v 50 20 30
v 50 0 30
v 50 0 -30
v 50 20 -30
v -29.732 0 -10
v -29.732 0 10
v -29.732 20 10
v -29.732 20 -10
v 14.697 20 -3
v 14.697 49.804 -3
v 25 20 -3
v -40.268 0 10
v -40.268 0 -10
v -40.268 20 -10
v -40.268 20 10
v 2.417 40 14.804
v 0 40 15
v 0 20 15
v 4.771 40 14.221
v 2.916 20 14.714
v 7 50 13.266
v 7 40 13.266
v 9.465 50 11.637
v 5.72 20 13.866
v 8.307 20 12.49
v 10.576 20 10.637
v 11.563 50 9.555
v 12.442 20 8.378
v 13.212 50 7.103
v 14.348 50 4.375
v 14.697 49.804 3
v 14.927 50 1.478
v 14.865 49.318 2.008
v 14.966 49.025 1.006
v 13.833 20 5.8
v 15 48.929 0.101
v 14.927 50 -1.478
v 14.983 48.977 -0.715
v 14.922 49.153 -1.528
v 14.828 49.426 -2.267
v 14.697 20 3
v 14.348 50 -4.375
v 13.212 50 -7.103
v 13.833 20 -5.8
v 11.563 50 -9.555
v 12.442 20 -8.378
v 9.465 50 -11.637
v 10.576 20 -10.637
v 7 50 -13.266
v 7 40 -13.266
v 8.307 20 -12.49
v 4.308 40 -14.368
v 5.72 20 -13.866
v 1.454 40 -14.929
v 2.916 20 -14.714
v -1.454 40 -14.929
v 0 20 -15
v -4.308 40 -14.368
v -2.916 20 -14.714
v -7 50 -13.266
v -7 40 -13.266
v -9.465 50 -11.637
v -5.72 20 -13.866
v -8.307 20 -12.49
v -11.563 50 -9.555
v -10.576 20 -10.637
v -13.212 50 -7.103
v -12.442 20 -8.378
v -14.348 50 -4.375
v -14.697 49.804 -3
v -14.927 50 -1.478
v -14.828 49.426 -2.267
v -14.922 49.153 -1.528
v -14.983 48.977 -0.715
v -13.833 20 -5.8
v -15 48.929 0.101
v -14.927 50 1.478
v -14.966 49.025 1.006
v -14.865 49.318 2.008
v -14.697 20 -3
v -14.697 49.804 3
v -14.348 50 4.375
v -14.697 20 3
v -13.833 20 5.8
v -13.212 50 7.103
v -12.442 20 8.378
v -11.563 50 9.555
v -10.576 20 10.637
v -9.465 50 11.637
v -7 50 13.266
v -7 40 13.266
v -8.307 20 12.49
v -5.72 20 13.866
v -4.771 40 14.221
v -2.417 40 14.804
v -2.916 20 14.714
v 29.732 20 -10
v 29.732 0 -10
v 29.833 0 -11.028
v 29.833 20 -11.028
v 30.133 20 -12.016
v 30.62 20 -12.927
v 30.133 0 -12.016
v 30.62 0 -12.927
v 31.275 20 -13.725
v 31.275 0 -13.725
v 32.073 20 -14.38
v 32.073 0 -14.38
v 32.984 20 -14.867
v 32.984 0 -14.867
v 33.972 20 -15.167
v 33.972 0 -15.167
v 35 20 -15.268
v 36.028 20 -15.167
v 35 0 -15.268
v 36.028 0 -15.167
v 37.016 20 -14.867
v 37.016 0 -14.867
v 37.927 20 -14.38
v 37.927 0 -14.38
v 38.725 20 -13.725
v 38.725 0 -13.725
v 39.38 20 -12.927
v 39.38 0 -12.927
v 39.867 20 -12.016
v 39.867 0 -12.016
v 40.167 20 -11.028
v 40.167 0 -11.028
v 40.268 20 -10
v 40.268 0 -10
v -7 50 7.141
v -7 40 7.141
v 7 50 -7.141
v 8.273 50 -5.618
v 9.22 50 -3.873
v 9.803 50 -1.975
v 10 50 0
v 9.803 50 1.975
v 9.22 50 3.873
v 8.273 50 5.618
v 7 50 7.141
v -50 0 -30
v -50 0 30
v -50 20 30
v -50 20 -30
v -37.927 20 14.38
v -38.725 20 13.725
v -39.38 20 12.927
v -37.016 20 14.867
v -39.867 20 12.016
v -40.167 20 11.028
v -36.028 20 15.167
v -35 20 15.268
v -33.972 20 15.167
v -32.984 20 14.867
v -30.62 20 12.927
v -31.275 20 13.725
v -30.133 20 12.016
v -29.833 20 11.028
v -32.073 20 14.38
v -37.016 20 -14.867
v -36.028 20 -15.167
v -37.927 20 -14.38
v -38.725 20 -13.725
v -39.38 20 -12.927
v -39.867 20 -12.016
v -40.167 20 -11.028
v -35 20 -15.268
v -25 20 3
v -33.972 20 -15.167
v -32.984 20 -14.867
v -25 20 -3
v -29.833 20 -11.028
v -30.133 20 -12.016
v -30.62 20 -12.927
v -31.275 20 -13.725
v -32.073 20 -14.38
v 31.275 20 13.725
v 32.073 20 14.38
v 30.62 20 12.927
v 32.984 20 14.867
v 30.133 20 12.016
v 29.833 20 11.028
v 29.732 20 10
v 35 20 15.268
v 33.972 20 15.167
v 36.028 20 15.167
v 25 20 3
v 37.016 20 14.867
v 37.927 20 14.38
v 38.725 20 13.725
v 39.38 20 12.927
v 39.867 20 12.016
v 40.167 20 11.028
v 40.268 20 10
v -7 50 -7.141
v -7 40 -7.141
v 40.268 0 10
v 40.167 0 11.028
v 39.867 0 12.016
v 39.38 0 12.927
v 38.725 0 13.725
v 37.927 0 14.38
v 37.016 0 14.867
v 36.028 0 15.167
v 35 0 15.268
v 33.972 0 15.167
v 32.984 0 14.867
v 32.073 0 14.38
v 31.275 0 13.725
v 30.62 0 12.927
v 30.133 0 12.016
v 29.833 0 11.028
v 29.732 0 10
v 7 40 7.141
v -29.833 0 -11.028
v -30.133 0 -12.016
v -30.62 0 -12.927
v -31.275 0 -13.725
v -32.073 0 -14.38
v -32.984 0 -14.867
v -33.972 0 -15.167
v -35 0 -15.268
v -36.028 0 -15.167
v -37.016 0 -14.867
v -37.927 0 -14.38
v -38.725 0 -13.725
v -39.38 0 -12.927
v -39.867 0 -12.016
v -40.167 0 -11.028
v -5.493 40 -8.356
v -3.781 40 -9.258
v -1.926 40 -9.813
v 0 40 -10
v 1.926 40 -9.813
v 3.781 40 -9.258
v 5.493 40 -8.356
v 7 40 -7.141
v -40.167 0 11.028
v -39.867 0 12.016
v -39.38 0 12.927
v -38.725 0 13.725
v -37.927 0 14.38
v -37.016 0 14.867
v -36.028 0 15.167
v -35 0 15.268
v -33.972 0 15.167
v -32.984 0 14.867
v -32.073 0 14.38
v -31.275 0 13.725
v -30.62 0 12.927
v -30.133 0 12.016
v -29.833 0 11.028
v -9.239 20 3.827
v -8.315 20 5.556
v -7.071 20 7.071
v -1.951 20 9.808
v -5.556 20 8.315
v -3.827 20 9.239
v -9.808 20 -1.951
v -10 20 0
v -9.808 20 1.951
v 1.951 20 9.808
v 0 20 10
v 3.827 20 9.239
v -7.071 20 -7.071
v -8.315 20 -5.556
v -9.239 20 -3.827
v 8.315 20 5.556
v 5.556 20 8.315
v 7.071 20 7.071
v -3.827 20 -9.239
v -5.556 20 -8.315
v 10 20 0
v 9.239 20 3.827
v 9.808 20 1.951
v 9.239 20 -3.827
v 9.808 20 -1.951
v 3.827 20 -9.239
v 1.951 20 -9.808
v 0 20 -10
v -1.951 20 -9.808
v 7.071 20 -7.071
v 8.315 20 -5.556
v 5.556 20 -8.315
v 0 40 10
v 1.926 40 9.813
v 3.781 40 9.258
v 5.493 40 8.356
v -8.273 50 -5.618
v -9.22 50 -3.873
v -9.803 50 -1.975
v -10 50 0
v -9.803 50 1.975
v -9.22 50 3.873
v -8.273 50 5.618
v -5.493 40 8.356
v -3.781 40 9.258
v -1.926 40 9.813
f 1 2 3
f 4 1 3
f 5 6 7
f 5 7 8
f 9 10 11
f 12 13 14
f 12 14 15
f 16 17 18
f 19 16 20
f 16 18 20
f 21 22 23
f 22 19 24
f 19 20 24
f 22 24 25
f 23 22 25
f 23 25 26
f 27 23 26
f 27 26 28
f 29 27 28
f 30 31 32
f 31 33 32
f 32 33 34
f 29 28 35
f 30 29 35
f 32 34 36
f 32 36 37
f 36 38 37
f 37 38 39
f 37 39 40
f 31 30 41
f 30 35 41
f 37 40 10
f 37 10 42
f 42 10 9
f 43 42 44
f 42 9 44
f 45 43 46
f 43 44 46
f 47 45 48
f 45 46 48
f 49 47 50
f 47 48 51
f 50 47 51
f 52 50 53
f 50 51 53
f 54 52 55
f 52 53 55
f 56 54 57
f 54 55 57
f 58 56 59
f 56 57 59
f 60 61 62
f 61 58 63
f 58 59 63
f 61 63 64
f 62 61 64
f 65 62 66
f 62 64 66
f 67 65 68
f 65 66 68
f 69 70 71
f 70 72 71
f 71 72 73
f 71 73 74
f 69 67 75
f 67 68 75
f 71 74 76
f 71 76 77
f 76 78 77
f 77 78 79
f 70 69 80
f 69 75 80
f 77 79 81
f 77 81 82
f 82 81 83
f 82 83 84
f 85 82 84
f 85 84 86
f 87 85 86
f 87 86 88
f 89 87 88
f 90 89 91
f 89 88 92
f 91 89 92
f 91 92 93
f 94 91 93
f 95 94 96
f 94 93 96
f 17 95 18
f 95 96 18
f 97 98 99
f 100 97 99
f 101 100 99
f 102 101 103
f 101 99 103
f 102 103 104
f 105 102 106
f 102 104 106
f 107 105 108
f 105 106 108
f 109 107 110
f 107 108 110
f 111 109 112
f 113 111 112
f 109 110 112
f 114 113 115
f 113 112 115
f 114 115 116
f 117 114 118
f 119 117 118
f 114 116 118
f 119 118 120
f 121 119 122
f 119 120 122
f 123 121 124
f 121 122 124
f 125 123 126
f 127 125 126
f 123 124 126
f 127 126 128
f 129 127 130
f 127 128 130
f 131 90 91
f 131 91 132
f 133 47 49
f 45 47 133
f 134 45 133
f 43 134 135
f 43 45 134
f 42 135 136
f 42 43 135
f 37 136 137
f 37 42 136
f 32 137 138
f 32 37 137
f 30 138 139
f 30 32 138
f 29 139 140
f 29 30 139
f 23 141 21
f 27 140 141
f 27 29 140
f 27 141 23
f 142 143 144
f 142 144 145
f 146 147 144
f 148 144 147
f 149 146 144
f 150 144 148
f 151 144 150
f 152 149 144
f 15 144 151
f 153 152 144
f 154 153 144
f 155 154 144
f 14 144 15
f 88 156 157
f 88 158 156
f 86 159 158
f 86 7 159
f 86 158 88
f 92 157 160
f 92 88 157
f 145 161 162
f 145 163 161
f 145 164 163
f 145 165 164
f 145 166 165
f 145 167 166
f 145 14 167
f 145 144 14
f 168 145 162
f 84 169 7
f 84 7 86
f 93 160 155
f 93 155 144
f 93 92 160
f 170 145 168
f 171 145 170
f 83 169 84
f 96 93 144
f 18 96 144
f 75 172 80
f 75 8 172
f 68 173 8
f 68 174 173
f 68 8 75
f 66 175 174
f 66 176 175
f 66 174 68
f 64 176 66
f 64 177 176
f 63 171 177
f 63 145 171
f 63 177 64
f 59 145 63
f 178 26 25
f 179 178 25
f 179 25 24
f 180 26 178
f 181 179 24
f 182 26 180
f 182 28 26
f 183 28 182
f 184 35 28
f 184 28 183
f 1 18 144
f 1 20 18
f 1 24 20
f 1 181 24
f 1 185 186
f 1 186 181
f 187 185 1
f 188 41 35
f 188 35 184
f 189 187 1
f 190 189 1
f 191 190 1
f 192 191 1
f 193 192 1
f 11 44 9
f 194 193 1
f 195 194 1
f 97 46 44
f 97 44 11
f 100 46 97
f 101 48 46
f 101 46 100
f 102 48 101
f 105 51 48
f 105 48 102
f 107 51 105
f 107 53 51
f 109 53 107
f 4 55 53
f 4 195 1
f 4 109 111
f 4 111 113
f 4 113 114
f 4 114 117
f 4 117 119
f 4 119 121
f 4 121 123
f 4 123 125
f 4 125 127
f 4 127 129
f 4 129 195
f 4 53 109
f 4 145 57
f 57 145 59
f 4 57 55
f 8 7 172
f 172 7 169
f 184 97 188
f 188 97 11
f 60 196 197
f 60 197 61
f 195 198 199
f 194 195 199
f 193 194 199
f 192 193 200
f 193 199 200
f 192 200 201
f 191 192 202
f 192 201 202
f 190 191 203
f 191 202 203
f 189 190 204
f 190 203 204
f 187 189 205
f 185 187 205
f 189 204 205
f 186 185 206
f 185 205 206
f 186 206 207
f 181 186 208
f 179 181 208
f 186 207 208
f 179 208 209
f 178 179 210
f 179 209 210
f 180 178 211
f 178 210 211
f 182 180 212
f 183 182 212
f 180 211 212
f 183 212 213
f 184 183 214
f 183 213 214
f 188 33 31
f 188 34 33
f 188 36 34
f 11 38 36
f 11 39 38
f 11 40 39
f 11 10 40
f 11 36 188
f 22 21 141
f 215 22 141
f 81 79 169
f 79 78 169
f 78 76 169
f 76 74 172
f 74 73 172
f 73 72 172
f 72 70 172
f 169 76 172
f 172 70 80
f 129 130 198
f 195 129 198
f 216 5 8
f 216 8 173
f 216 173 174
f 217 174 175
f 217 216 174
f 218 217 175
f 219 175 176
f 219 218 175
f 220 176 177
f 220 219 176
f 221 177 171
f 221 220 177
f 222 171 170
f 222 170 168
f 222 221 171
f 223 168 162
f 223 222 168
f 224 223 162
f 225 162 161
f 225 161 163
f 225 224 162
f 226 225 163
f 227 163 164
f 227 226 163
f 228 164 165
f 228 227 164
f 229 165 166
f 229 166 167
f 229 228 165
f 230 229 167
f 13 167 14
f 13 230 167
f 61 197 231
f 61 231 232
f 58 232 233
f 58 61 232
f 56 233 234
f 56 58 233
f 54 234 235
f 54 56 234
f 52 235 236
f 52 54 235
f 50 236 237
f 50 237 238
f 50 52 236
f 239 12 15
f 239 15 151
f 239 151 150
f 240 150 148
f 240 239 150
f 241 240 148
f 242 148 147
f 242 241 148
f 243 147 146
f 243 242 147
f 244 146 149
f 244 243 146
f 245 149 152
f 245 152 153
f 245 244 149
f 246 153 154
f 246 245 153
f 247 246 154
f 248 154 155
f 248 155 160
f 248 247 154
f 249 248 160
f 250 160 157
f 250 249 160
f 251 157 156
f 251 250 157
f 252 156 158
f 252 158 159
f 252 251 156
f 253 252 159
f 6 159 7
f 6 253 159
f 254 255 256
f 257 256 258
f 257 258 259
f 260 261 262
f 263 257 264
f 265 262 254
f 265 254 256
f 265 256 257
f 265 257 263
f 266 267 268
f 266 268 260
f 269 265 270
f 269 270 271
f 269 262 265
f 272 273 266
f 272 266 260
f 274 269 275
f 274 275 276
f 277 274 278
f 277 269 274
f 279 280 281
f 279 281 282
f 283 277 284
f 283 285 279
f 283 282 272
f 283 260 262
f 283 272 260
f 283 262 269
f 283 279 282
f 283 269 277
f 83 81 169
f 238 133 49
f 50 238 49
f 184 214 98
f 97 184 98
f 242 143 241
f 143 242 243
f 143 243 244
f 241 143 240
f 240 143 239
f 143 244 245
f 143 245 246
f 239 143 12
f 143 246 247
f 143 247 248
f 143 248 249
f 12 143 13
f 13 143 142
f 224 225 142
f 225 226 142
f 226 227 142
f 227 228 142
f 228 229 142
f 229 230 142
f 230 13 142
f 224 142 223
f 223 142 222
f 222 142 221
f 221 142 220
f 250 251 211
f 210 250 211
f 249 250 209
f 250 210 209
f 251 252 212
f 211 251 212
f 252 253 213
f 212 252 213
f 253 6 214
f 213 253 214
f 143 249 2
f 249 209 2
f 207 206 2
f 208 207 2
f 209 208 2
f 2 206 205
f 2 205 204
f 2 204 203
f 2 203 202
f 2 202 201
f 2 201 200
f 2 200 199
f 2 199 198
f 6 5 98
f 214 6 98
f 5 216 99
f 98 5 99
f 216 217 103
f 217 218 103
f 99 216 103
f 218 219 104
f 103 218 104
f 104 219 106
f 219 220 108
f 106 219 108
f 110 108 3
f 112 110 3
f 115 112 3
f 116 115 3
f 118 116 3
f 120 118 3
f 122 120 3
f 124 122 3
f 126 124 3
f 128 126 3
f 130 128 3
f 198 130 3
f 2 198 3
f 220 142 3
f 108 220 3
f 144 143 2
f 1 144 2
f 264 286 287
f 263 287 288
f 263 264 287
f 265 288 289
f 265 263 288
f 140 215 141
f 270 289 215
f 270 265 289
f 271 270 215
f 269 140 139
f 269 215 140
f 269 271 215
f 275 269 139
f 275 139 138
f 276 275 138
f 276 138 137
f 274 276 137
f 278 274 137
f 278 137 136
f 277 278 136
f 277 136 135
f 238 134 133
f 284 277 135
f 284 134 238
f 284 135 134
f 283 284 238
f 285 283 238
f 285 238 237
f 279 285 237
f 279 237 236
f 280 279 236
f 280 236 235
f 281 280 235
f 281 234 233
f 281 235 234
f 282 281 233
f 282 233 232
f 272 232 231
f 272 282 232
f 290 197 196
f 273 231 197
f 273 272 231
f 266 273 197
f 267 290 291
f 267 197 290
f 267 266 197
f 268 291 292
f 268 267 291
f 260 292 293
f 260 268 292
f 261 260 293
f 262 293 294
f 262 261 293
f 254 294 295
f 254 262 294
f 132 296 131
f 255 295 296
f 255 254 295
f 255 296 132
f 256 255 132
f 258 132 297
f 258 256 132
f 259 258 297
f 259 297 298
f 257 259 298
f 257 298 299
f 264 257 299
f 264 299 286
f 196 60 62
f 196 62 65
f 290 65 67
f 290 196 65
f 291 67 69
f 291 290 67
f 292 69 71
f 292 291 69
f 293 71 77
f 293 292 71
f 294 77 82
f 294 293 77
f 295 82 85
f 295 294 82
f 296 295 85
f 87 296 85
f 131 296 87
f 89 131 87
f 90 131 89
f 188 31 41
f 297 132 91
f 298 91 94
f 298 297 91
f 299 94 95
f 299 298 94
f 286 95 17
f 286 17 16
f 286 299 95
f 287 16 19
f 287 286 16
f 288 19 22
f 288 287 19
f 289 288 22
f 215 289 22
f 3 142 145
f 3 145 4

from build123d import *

# Parameters (mm, degrees)
SKETCH1_W           = 100
SKETCH1_H           = 60
BOSS_EXTRUDE2_DEPTH = 20
SKETCH2_R           = 15
SKETCH2_R_2         = 10
BOSS_EXTRUDE3_DEPTH = 30
SKETCH3_W           = 14
SKETCH3_H           = 35.201995264
CUT_EXTRUDE1_DEPTH  = 10
RIB4_REACH          = 78.811
SKETCH19_WALL_W     = 186.230224572
SKETCH19_WALL_H     = 6


with BuildPart() as part:
    # Sketch1 → Boss-Extrude2 (new body)
    with BuildSketch(Plane(origin=(0, 0, 0), x_dir=(1, 0, 0), z_dir=(0, 1, 0))):
        Rectangle(SKETCH1_W, SKETCH1_H)
        with BuildLine():
            ThreePointArc((-44.951219512, -10), (-35, -19.951219512), (-25.048780488, -10))
            Line((-25.048780488, -10), (-25.048780488, 10))
            ThreePointArc((-25.048780488, 10), (-35, 19.951219512), (-44.951219512, 10))
            Line((-44.951219512, 10), (-44.951219512, -10))
        make_face(mode=Mode.SUBTRACT)
        with BuildLine():
            Line((44.951219512, 10), (44.951219512, -10))
            ThreePointArc((44.951219512, -10), (35, -19.951219512), (25.048780488, -10))
            Line((25.048780488, -10), (25.048780488, 10))
            ThreePointArc((25.048780488, 10), (35, 19.951219512), (44.951219512, 10))
        make_face(mode=Mode.SUBTRACT)
        with BuildLine():
            Line((-44.951219512, 10), (-44.951219512, -10))
            ThreePointArc((-44.951219512, -10), (-35, -19.951219512), (-25.048780488, -10))
            Line((-25.048780488, -10), (-25.048780488, 10))
            ThreePointArc((-25.048780488, 10), (-35, 19.951219512), (-44.951219512, 10))
        make_face()
        with BuildLine():
            ThreePointArc((-40.268292683, -10), (-35, -15.268292683), (-29.731707317, -10))
            Line((-29.731707317, -10), (-29.731707317, 10))
            ThreePointArc((-29.731707317, 10), (-35, 15.268292683), (-40.268292683, 10))
            Line((-40.268292683, 10), (-40.268292683, -10))
        make_face(mode=Mode.SUBTRACT)
        with BuildLine():
            ThreePointArc((44.951219512, -10), (35, -19.951219512), (25.048780488, -10))
            Line((25.048780488, -10), (25.048780488, 10))
            ThreePointArc((25.048780488, 10), (35, 19.951219512), (44.951219512, 10))
            Line((44.951219512, 10), (44.951219512, -10))
        make_face()
        with BuildLine():
            Line((40.268292683, 10), (40.268292683, -10))
            ThreePointArc((40.268292683, -10), (35, -15.268292683), (29.731707317, -10))
            Line((29.731707317, -10), (29.731707317, 10))
            ThreePointArc((29.731707317, 10), (35, 15.268292683), (40.268292683, 10))
        make_face(mode=Mode.SUBTRACT)
    extrude(amount=BOSS_EXTRUDE2_DEPTH)

    # Sketch2 → Boss-Extrude3 (add)
    with BuildSketch(Plane(origin=(0, 20, 0), x_dir=(1, 0, 0), z_dir=(0, 1, 0))):
        with Locations(Location((0, 0, 0), (0, 0, 270))):
            Circle(SKETCH2_R)
        with Locations(Location((0, 0, 0), (0, 0, 270))):
            Circle(SKETCH2_R_2, mode=Mode.SUBTRACT)
    extrude(amount=BOSS_EXTRUDE3_DEPTH)

    # Sketch3 → Cut-Extrude1 (cut)
    with BuildSketch(Plane(origin=(0, 50, 0), x_dir=(1, 0, 0), z_dir=(0, 1, 0))):
        Rectangle(SKETCH3_W, SKETCH3_H)
    extrude(amount=-CUT_EXTRUDE1_DEPTH, mode=Mode.SUBTRACT)

    # Sketch19 wall → Rib4 (add, up to next)
    with BuildSketch(Plane(origin=(20, 34.463811754, 0), x_dir=(0.32671934012, -0.945121406377, 0), z_dir=(0.945121406377, 0.32671934012, 0)), mode=Mode.PRIVATE) as rib4_sk1:
        Rectangle(SKETCH19_WALL_W, SKETCH19_WALL_H)
    rib4_tool1 = extrude(rib4_sk1.sketch, amount=-RIB4_REACH, mode=Mode.PRIVATE) - part.part
    rib4 = rib4_tool1.solids().sort_by_distance((20, 34.463811754, 0))[0]
    add(rib4)

    # Mirror2: Rib4 across plane
    add(rib4.mirror(Plane(origin=(0, 0, 0), x_dir=(0, 0, 1), z_dir=(1, 0, 0))))


solid = part.part
